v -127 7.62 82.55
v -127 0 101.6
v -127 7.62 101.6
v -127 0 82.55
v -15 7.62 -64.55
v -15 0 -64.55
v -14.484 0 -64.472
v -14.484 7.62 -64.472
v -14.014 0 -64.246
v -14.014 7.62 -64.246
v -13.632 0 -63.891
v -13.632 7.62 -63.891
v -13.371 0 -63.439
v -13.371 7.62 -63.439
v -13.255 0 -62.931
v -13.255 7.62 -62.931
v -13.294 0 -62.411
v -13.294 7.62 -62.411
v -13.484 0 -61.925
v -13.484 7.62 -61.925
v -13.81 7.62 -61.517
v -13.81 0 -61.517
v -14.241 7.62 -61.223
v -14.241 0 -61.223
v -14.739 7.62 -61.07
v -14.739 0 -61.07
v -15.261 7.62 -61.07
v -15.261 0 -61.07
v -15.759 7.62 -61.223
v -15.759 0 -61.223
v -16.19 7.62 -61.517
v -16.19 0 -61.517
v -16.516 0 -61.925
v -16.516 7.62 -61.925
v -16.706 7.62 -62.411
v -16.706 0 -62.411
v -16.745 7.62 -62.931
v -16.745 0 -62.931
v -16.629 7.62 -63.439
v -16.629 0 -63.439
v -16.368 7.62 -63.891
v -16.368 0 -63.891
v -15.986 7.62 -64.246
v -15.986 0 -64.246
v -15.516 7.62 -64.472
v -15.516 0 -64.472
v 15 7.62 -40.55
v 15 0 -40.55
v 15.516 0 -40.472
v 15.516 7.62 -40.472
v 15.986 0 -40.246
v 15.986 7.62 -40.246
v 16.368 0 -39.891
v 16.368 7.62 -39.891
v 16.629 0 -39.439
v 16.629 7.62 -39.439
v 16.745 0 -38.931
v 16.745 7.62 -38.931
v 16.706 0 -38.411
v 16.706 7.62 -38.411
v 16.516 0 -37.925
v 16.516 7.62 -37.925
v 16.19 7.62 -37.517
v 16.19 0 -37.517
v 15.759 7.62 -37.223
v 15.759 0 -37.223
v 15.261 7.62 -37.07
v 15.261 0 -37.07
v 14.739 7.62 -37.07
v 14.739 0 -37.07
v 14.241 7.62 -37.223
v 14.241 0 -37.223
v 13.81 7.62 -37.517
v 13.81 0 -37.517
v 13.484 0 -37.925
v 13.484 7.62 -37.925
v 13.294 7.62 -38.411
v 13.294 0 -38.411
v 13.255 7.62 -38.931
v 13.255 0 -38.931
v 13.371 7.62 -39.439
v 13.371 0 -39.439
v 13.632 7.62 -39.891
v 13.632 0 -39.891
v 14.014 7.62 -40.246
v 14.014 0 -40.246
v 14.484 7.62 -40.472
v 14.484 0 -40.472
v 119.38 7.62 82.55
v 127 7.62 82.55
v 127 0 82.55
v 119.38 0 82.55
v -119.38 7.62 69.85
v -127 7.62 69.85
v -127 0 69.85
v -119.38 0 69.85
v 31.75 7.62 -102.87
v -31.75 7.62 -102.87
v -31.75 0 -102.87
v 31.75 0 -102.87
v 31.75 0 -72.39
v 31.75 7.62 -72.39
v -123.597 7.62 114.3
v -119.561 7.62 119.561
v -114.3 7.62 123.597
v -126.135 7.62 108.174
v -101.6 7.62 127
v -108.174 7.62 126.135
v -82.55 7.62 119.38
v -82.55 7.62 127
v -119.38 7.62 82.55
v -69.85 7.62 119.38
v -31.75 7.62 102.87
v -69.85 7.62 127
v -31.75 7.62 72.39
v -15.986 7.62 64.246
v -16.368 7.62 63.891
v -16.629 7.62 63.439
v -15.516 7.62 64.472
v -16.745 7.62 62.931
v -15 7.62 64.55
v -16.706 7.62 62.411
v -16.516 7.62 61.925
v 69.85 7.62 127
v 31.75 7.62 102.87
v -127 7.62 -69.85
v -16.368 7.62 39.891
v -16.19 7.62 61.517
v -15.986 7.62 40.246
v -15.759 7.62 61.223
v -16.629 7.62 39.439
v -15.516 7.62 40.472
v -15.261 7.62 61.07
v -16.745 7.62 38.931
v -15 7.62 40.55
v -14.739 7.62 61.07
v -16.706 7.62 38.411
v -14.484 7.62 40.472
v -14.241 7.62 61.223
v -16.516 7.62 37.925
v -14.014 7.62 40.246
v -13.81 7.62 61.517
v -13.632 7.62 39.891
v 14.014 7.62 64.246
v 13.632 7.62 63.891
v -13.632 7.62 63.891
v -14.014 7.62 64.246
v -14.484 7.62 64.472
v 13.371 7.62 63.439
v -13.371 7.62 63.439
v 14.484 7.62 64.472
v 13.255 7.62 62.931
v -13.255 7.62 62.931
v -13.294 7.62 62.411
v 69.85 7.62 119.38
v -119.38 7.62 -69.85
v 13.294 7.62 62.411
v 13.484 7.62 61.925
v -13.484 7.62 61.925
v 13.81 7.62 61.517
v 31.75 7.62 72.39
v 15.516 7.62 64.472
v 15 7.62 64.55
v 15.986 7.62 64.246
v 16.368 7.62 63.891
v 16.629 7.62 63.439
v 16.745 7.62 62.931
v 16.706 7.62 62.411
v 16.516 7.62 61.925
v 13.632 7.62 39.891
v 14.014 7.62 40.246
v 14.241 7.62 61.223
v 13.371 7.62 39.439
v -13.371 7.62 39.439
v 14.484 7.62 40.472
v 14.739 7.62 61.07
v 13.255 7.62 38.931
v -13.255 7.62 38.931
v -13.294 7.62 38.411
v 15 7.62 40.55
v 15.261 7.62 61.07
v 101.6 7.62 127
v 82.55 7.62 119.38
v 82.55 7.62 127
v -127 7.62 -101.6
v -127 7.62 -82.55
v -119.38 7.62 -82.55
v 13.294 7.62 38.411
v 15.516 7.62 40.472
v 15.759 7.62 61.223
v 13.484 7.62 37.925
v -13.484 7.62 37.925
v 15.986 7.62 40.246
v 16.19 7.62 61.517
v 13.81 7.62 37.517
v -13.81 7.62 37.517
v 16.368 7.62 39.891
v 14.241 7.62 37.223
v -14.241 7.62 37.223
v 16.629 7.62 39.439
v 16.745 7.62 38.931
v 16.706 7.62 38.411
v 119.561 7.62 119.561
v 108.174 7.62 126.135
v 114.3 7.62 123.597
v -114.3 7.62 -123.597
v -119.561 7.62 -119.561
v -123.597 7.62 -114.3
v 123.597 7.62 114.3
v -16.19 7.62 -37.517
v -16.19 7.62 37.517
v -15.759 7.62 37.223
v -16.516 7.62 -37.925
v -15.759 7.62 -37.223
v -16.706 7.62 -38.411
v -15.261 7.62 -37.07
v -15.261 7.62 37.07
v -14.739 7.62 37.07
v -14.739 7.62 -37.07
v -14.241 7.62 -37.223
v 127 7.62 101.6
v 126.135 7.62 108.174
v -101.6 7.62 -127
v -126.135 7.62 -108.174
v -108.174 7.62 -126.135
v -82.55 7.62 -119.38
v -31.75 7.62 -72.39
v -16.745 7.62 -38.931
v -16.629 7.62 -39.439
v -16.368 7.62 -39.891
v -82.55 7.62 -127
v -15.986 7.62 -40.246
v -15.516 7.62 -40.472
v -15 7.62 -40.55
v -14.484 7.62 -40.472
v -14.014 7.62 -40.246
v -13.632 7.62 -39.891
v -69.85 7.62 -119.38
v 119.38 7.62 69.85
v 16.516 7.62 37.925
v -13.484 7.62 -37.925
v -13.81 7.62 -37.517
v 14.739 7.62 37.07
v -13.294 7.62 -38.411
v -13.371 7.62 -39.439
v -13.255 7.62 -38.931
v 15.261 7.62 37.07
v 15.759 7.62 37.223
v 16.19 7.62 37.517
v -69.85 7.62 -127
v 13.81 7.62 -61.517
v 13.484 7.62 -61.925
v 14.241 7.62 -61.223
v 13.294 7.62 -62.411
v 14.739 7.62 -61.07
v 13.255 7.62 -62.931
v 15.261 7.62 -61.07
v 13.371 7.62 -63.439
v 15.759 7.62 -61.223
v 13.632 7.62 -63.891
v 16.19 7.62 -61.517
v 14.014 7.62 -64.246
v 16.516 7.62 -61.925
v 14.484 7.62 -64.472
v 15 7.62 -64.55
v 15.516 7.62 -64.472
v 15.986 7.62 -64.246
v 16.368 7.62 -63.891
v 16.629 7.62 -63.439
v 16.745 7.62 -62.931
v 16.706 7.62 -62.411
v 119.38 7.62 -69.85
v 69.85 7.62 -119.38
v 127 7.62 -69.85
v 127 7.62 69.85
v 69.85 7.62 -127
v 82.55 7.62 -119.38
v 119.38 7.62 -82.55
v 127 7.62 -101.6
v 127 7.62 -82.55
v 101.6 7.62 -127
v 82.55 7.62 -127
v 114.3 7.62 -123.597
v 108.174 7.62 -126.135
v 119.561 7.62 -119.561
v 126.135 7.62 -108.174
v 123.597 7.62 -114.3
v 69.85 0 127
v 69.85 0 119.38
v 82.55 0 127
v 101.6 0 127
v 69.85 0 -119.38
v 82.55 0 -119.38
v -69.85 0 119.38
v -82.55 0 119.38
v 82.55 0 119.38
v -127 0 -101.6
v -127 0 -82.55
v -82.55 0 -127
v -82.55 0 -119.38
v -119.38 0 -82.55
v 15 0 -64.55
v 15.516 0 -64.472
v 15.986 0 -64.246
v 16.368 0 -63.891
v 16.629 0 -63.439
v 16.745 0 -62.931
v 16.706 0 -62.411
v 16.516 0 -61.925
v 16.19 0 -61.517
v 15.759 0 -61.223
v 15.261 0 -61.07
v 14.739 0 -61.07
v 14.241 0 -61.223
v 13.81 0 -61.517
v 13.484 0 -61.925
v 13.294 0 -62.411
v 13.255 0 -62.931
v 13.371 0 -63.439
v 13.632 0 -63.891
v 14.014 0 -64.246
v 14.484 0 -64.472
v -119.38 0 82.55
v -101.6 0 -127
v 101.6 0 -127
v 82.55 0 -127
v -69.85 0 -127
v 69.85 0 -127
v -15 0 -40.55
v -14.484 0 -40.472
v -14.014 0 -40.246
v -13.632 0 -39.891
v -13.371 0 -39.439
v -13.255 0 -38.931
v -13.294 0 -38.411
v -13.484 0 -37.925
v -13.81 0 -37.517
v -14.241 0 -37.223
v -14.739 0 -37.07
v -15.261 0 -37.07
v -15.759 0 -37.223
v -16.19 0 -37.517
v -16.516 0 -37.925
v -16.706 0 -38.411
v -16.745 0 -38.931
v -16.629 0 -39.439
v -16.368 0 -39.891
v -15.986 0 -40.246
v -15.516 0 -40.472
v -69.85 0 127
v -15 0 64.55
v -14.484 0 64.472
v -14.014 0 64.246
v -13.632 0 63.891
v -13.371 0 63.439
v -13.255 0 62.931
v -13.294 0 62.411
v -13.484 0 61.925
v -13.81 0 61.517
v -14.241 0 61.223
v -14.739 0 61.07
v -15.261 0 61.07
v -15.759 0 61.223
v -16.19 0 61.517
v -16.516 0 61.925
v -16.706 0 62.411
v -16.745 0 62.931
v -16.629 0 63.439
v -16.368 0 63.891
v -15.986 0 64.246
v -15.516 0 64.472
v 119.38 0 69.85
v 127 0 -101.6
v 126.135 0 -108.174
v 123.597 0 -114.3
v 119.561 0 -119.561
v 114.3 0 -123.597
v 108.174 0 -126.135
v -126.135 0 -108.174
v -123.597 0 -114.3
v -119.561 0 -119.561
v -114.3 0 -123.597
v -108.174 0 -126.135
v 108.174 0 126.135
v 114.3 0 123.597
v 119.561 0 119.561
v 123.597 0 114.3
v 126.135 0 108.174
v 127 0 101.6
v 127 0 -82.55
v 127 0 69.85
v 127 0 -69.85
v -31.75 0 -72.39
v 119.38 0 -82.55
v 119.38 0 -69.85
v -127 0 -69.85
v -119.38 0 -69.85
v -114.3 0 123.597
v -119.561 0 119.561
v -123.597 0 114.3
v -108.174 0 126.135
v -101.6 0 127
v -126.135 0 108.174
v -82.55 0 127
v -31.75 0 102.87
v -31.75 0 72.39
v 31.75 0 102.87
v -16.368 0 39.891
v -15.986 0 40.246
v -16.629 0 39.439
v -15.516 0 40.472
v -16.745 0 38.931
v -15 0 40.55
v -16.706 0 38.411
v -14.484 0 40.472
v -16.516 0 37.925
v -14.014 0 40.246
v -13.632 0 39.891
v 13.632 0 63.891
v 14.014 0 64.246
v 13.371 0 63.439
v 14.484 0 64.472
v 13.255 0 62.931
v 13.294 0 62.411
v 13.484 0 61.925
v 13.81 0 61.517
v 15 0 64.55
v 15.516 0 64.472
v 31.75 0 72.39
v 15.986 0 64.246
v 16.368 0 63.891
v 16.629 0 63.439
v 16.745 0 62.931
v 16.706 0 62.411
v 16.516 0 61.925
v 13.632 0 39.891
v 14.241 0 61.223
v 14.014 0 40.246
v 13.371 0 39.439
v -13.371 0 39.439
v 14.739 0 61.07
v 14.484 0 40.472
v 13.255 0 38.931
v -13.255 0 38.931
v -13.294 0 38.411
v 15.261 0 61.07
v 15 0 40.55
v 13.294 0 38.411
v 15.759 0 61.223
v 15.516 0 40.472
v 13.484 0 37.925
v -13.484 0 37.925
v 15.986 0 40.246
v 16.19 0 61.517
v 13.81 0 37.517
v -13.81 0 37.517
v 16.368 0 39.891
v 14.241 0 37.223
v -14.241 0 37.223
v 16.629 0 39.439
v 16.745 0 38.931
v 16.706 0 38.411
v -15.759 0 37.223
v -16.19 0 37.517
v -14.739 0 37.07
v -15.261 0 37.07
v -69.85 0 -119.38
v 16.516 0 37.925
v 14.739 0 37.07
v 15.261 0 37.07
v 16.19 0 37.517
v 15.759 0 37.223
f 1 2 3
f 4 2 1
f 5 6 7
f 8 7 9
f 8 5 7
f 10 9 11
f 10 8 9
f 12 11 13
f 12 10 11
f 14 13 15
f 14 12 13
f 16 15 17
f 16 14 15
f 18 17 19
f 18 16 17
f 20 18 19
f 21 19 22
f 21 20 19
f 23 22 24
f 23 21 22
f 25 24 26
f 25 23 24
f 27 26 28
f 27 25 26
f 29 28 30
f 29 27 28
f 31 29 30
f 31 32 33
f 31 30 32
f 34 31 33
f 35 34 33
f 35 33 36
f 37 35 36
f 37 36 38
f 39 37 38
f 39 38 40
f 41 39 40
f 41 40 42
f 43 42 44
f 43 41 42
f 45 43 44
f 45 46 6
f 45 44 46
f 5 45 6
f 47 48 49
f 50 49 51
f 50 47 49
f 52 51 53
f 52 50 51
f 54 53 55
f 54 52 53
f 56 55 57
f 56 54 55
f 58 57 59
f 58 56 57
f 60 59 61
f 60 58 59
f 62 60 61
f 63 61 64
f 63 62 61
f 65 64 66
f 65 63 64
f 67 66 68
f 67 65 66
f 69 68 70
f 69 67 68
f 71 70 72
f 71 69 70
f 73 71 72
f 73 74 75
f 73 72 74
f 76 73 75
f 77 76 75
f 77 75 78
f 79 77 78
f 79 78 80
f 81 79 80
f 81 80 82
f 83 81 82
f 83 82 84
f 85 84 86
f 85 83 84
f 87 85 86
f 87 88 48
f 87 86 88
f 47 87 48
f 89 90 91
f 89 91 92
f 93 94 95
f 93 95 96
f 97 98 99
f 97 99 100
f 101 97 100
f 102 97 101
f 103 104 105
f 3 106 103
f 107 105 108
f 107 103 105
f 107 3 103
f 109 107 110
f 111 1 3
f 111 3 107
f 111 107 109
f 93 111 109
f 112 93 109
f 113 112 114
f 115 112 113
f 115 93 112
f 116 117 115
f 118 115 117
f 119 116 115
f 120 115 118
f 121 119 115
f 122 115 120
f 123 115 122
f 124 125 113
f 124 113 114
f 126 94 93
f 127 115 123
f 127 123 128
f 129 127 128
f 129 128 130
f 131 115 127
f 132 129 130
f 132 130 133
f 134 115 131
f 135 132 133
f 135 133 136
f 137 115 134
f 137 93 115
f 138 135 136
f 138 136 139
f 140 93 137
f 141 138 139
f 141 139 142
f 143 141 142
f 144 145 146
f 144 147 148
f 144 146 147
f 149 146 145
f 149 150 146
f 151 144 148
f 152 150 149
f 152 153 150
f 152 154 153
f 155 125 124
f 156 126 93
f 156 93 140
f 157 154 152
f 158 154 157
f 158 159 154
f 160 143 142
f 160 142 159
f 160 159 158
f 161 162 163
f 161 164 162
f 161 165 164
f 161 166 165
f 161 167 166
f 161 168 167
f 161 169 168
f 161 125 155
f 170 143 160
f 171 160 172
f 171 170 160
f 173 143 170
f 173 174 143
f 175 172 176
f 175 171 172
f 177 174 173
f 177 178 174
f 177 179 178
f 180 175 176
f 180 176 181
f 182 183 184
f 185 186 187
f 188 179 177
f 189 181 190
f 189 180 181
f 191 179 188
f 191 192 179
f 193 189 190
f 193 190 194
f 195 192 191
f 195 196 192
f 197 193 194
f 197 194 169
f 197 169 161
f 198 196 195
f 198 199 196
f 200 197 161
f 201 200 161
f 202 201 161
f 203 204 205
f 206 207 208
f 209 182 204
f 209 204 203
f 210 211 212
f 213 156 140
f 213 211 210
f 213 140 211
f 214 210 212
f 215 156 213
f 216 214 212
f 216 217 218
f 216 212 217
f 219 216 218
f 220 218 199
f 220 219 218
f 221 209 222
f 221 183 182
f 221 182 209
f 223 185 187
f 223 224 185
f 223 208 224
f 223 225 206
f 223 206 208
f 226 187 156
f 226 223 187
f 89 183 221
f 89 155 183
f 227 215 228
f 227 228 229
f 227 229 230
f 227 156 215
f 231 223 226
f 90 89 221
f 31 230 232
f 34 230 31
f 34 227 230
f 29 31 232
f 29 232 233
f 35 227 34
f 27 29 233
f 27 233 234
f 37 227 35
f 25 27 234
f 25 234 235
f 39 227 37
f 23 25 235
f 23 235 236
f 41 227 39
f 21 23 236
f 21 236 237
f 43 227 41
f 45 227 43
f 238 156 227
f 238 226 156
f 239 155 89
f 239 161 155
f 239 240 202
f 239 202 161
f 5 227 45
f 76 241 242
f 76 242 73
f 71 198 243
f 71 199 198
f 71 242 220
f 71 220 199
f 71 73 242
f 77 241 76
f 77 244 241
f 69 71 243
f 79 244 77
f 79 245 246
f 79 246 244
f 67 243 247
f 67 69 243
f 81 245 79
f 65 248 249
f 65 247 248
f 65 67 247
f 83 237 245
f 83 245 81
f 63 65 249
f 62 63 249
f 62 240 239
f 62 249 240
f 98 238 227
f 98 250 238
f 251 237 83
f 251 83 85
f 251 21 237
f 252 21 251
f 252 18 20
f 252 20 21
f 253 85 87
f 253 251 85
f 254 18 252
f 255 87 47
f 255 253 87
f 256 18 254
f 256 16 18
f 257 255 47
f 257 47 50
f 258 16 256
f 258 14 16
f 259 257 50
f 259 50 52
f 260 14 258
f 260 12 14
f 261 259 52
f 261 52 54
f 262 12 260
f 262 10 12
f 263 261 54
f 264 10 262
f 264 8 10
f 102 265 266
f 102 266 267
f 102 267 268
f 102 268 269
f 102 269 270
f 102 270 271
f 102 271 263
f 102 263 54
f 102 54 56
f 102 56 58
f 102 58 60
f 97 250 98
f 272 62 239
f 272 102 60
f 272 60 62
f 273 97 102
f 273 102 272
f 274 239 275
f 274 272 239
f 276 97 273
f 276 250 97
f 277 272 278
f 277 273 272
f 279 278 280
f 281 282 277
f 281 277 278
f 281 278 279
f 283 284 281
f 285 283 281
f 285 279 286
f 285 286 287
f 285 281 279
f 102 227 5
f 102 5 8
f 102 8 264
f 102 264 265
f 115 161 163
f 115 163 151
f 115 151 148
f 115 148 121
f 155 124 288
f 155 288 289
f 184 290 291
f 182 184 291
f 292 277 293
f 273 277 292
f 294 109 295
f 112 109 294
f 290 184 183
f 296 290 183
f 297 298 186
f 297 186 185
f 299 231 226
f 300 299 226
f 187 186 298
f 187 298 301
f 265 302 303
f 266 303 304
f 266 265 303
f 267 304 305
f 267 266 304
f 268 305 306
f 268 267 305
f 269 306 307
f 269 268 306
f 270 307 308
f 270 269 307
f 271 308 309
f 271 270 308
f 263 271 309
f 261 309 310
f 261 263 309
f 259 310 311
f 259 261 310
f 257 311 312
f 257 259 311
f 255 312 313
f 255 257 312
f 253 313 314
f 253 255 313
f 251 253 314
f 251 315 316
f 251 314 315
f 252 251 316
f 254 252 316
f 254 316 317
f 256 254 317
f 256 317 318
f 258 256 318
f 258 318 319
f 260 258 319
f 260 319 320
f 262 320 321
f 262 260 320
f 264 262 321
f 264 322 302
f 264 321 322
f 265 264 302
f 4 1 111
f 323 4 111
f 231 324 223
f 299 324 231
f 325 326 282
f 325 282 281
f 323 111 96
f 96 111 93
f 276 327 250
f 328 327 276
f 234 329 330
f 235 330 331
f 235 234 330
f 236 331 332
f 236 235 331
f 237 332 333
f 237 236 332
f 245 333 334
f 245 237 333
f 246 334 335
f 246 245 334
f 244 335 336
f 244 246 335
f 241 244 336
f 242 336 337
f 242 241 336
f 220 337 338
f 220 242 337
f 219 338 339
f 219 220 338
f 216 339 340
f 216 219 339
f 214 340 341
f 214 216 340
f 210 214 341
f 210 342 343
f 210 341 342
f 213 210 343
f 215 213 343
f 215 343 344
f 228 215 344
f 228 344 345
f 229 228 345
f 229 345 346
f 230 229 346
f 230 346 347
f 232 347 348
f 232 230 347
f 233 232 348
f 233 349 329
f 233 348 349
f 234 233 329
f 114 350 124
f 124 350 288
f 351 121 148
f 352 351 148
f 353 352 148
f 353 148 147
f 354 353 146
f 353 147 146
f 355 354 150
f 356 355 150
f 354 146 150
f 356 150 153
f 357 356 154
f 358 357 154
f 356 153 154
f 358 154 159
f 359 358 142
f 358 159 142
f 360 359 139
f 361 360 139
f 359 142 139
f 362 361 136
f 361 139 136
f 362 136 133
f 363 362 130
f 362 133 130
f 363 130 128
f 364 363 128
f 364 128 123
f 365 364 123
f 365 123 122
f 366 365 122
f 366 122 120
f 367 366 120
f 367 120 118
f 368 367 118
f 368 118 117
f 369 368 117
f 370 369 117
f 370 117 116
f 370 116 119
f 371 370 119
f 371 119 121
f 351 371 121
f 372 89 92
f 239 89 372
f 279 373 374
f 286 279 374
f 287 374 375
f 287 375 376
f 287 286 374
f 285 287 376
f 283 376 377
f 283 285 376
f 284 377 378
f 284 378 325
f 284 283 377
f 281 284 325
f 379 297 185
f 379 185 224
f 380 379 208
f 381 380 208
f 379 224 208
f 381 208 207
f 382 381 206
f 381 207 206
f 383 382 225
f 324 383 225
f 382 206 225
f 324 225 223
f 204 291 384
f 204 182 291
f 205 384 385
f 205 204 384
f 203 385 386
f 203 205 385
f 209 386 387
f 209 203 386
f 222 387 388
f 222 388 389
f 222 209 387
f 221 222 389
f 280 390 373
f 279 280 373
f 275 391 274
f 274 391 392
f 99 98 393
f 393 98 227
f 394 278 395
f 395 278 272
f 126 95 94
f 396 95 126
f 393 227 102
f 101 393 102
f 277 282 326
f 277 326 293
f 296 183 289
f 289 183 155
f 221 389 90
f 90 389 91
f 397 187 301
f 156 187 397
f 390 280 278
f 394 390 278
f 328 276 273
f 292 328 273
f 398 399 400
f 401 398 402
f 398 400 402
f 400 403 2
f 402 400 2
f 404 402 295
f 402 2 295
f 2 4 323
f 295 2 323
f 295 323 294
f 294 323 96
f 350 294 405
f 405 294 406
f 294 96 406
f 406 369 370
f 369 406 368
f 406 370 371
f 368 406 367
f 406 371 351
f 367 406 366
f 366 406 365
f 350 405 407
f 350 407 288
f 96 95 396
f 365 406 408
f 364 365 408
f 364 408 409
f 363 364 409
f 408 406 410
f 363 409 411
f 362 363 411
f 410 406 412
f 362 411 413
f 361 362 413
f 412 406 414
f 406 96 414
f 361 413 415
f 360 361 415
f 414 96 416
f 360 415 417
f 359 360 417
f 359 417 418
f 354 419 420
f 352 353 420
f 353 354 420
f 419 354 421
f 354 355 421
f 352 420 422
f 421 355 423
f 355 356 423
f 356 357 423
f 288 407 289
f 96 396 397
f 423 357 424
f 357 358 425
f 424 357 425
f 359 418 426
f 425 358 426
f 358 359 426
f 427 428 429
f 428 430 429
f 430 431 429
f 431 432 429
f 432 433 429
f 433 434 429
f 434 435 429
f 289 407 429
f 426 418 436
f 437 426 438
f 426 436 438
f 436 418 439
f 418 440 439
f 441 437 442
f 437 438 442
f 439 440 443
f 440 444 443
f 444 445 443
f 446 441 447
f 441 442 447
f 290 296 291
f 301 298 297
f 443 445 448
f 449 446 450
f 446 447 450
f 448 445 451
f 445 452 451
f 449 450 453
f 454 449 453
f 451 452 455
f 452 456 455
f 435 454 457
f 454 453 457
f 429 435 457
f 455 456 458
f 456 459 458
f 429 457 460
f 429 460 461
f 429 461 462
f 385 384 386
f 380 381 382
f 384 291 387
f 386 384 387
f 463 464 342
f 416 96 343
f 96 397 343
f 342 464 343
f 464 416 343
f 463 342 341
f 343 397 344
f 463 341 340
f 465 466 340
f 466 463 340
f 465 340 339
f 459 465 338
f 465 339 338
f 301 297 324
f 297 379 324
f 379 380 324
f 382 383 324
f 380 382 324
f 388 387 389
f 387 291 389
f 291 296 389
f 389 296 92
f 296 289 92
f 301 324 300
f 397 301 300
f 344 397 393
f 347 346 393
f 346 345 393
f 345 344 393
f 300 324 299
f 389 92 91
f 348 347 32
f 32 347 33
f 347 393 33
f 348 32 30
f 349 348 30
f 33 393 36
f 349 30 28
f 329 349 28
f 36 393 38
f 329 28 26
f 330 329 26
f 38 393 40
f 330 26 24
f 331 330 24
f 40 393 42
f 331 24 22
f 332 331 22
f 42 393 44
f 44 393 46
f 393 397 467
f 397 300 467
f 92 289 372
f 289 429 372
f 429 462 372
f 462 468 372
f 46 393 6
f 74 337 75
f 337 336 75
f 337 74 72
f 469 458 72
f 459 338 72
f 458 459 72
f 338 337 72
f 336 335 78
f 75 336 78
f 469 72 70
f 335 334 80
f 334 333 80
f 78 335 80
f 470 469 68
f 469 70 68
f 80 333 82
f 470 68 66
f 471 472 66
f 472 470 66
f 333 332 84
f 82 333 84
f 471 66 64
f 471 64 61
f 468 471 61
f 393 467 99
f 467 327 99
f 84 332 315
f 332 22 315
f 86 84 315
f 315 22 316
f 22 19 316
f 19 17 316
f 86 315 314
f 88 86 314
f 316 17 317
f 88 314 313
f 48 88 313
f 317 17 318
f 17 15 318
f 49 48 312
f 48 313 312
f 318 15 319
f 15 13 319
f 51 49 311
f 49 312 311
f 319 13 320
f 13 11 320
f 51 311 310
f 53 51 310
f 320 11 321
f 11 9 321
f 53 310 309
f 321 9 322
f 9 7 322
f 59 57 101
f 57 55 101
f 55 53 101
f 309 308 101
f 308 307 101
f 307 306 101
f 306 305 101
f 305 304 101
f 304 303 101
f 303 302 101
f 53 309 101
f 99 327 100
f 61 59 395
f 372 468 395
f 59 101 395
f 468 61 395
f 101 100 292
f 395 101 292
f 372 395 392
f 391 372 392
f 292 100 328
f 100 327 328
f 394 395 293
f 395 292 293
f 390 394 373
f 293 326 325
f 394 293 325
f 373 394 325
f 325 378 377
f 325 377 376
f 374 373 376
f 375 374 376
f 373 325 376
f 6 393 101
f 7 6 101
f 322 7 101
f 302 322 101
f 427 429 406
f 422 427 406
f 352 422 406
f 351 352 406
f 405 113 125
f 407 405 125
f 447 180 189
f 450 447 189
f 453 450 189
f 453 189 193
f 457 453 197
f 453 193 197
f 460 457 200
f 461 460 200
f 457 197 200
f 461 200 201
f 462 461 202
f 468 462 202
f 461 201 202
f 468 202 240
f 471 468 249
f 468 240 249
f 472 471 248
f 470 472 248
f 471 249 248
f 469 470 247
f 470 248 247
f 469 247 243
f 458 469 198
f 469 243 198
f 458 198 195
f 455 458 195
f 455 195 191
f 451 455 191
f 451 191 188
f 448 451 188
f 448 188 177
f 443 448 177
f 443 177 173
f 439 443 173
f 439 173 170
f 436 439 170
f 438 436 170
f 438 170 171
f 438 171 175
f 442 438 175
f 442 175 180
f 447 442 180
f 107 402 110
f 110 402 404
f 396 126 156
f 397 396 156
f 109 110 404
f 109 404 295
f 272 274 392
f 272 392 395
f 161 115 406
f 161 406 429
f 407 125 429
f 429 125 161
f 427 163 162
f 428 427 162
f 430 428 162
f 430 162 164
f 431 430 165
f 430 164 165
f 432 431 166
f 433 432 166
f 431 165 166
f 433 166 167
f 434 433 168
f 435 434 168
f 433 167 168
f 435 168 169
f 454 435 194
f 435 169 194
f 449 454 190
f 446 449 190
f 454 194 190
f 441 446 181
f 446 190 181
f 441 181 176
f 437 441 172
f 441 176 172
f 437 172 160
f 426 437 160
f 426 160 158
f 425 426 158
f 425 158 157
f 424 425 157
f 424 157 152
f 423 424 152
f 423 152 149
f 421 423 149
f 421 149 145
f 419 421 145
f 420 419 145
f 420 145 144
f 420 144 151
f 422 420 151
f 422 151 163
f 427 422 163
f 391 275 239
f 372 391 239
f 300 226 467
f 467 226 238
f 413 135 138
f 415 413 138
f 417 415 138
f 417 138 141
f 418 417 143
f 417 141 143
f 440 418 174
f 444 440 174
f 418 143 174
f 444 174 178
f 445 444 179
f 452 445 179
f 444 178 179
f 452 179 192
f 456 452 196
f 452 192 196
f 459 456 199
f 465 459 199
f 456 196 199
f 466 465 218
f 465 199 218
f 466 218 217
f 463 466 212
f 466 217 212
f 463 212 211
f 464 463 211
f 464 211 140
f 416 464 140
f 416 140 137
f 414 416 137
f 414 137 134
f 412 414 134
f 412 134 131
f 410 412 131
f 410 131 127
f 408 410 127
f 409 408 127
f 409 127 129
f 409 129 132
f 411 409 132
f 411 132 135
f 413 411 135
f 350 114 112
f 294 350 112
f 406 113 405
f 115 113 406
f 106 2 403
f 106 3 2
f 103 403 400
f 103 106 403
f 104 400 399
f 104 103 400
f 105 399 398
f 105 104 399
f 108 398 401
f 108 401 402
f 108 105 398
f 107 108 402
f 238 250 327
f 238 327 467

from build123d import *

# Parameters (mm, degrees)
SKETCH1_W               = 254
SKETCH1_H               = 254
PLATFORM_BASE_DEPTH     = 7.62
CORNER_ROUNDING_R       = 25.4
SKETCH3_R               = 1.75
CUT_EXTRUDE1_DEPTH      = 180.766694357
SKETCH4_W               = 63.5
SKETCH4_H               = 30.48
CUT_EXTRUDE2_DEPTH      = 180.766694357
SKETCH6_W               = 12.7
SKETCH6_H               = 7.62
CUT_EXTRUDE3_DEPTH      = 180.766694357
MIRROR5_COPY_1_SKETCH_W = 12.7
MIRROR5_COPY_1_SKETCH_H = 7.62
MIRROR5_COPY_1_DEPTH    = 180.766694357
MIRROR5_COPY_2_SKETCH_W = 12.7
MIRROR5_COPY_2_SKETCH_H = 7.62
MIRROR5_COPY_2_DEPTH    = 180.766694357
SKETCH8_W               = 7.62
SKETCH8_H               = 12.7
CUT_EXTRUDE4_DEPTH      = 180.766694357
MIRROR7_COPY_1_SKETCH_W = 7.62
MIRROR7_COPY_1_SKETCH_H = 12.7
MIRROR7_COPY_1_DEPTH    = 180.766694357
MIRROR7_COPY_2_SKETCH_W = 7.62
MIRROR7_COPY_2_SKETCH_H = 12.7
MIRROR7_COPY_2_DEPTH    = 180.766694357


with BuildPart() as part:
    # Sketch1 → Platform-Base (new body)
    with BuildSketch(Plane(origin=(0, 0, 0), x_dir=(1, 0, 0), z_dir=(0, 1, 0))):
        Rectangle(SKETCH1_W, SKETCH1_H)
    extrude(amount=PLATFORM_BASE_DEPTH)

    # Corner-Rounding
    corner_rounding_edges = [part.edges().sort_by_distance(p)[0] for p in [
        (-127, 3.81, -127),
        (127, 3.81, -127),
        (127, 3.81, 127),
        (-127, 3.81, 127),
    ]]
    fillet(corner_rounding_edges, radius=CORNER_ROUNDING_R)

    # Sketch3 → Cut-Extrude1 (cut, through all)
    with BuildSketch(Plane(origin=(0, 7.62, 0), x_dir=(1, 0, 0), z_dir=(0, 1, 0))):
        with Locations((15, -38.8)):
            Circle(SKETCH3_R)
        with Locations((15, -62.8)):
            Circle(SKETCH3_R)
        with Locations((-15, -62.8)):
            Circle(SKETCH3_R)
        with Locations((-15, -38.8)):
            Circle(SKETCH3_R)
    cut_extrude1 = extrude(amount=-CUT_EXTRUDE1_DEPTH, mode=Mode.SUBTRACT)

    # Mirror2: Cut-Extrude1 across plane
    add(cut_extrude1.mirror(Plane.XY), mode=Mode.SUBTRACT)

    # Sketch4 → Cut-Extrude2 (cut, through all)
    with BuildSketch(Plane(origin=(0, 7.62, 0), x_dir=(1, 0, 0), z_dir=(0, 1, 0))):
        with Locations((0, -87.63)):
            Rectangle(SKETCH4_W, SKETCH4_H)
    cut_extrude2 = extrude(amount=-CUT_EXTRUDE2_DEPTH, mode=Mode.SUBTRACT)

    # Mirror3: Cut-Extrude2 across plane
    add(cut_extrude2.mirror(Plane.XY), mode=Mode.SUBTRACT)

    # Sketch6 → Cut-Extrude3 (cut, through all)
    with BuildSketch(Plane(origin=(0, 7.62, 0), x_dir=(1, 0, 0), z_dir=(0, 1, 0))):
        with Locations((-76.2, -123.19)):
            Rectangle(SKETCH6_W, SKETCH6_H)
    cut_extrude3 = extrude(amount=-CUT_EXTRUDE3_DEPTH, mode=Mode.SUBTRACT)

    # Mirror4: Cut-Extrude3 across plane
    add(cut_extrude3.mirror(Plane.XY), mode=Mode.SUBTRACT)

    # Mirror5 copy 1 sketch → Mirror5 copy 1 (cut, through all)
    with BuildSketch(Plane(origin=(0, 7.62, 0), x_dir=(-1, 0, 0), z_dir=(0, 1, 0))):
        with Locations((-76.2, -123.19)):
            Rectangle(MIRROR5_COPY_1_SKETCH_W, MIRROR5_COPY_1_SKETCH_H)
    extrude(amount=-MIRROR5_COPY_1_DEPTH, mode=Mode.SUBTRACT)

    # Mirror5 copy 2 sketch → Mirror5 copy 2 (cut, through all)
    with BuildSketch(Plane(origin=(0, 7.62, 0), x_dir=(-1, 0, 0), z_dir=(0, 1, 0))):
        with Locations((-76.2, 123.19)):
            Rectangle(MIRROR5_COPY_2_SKETCH_W, MIRROR5_COPY_2_SKETCH_H)
    extrude(amount=-MIRROR5_COPY_2_DEPTH, mode=Mode.SUBTRACT)

    # Sketch8 → Cut-Extrude4 (cut, through all)
    with BuildSketch(Plane(origin=(0, 7.62, 0), x_dir=(1, 0, 0), z_dir=(0, 1, 0))):
        with Locations((-123.19, -76.2)):
            Rectangle(SKETCH8_W, SKETCH8_H)
    cut_extrude4 = extrude(amount=-CUT_EXTRUDE4_DEPTH, mode=Mode.SUBTRACT)

    # Mirror6: Cut-Extrude4 across plane
    add(cut_extrude4.mirror(Plane.XY), mode=Mode.SUBTRACT)

    # Mirror7 copy 1 sketch → Mirror7 copy 1 (cut, through all)
    with BuildSketch(Plane(origin=(0, 7.62, 0), x_dir=(-1, 0, 0), z_dir=(0, 1, 0))):
        with Locations((-123.19, -76.2)):
            Rectangle(MIRROR7_COPY_1_SKETCH_W, MIRROR7_COPY_1_SKETCH_H)
    extrude(amount=-MIRROR7_COPY_1_DEPTH, mode=Mode.SUBTRACT)

    # Mirror7 copy 2 sketch → Mirror7 copy 2 (cut, through all)
    with BuildSketch(Plane(origin=(0, 7.62, 0), x_dir=(-1, 0, 0), z_dir=(0, 1, 0))):
        with Locations((-123.19, 76.2)):
            Rectangle(MIRROR7_COPY_2_SKETCH_W, MIRROR7_COPY_2_SKETCH_H)
    extrude(amount=-MIRROR7_COPY_2_DEPTH, mode=Mode.SUBTRACT)


solid = part.part
